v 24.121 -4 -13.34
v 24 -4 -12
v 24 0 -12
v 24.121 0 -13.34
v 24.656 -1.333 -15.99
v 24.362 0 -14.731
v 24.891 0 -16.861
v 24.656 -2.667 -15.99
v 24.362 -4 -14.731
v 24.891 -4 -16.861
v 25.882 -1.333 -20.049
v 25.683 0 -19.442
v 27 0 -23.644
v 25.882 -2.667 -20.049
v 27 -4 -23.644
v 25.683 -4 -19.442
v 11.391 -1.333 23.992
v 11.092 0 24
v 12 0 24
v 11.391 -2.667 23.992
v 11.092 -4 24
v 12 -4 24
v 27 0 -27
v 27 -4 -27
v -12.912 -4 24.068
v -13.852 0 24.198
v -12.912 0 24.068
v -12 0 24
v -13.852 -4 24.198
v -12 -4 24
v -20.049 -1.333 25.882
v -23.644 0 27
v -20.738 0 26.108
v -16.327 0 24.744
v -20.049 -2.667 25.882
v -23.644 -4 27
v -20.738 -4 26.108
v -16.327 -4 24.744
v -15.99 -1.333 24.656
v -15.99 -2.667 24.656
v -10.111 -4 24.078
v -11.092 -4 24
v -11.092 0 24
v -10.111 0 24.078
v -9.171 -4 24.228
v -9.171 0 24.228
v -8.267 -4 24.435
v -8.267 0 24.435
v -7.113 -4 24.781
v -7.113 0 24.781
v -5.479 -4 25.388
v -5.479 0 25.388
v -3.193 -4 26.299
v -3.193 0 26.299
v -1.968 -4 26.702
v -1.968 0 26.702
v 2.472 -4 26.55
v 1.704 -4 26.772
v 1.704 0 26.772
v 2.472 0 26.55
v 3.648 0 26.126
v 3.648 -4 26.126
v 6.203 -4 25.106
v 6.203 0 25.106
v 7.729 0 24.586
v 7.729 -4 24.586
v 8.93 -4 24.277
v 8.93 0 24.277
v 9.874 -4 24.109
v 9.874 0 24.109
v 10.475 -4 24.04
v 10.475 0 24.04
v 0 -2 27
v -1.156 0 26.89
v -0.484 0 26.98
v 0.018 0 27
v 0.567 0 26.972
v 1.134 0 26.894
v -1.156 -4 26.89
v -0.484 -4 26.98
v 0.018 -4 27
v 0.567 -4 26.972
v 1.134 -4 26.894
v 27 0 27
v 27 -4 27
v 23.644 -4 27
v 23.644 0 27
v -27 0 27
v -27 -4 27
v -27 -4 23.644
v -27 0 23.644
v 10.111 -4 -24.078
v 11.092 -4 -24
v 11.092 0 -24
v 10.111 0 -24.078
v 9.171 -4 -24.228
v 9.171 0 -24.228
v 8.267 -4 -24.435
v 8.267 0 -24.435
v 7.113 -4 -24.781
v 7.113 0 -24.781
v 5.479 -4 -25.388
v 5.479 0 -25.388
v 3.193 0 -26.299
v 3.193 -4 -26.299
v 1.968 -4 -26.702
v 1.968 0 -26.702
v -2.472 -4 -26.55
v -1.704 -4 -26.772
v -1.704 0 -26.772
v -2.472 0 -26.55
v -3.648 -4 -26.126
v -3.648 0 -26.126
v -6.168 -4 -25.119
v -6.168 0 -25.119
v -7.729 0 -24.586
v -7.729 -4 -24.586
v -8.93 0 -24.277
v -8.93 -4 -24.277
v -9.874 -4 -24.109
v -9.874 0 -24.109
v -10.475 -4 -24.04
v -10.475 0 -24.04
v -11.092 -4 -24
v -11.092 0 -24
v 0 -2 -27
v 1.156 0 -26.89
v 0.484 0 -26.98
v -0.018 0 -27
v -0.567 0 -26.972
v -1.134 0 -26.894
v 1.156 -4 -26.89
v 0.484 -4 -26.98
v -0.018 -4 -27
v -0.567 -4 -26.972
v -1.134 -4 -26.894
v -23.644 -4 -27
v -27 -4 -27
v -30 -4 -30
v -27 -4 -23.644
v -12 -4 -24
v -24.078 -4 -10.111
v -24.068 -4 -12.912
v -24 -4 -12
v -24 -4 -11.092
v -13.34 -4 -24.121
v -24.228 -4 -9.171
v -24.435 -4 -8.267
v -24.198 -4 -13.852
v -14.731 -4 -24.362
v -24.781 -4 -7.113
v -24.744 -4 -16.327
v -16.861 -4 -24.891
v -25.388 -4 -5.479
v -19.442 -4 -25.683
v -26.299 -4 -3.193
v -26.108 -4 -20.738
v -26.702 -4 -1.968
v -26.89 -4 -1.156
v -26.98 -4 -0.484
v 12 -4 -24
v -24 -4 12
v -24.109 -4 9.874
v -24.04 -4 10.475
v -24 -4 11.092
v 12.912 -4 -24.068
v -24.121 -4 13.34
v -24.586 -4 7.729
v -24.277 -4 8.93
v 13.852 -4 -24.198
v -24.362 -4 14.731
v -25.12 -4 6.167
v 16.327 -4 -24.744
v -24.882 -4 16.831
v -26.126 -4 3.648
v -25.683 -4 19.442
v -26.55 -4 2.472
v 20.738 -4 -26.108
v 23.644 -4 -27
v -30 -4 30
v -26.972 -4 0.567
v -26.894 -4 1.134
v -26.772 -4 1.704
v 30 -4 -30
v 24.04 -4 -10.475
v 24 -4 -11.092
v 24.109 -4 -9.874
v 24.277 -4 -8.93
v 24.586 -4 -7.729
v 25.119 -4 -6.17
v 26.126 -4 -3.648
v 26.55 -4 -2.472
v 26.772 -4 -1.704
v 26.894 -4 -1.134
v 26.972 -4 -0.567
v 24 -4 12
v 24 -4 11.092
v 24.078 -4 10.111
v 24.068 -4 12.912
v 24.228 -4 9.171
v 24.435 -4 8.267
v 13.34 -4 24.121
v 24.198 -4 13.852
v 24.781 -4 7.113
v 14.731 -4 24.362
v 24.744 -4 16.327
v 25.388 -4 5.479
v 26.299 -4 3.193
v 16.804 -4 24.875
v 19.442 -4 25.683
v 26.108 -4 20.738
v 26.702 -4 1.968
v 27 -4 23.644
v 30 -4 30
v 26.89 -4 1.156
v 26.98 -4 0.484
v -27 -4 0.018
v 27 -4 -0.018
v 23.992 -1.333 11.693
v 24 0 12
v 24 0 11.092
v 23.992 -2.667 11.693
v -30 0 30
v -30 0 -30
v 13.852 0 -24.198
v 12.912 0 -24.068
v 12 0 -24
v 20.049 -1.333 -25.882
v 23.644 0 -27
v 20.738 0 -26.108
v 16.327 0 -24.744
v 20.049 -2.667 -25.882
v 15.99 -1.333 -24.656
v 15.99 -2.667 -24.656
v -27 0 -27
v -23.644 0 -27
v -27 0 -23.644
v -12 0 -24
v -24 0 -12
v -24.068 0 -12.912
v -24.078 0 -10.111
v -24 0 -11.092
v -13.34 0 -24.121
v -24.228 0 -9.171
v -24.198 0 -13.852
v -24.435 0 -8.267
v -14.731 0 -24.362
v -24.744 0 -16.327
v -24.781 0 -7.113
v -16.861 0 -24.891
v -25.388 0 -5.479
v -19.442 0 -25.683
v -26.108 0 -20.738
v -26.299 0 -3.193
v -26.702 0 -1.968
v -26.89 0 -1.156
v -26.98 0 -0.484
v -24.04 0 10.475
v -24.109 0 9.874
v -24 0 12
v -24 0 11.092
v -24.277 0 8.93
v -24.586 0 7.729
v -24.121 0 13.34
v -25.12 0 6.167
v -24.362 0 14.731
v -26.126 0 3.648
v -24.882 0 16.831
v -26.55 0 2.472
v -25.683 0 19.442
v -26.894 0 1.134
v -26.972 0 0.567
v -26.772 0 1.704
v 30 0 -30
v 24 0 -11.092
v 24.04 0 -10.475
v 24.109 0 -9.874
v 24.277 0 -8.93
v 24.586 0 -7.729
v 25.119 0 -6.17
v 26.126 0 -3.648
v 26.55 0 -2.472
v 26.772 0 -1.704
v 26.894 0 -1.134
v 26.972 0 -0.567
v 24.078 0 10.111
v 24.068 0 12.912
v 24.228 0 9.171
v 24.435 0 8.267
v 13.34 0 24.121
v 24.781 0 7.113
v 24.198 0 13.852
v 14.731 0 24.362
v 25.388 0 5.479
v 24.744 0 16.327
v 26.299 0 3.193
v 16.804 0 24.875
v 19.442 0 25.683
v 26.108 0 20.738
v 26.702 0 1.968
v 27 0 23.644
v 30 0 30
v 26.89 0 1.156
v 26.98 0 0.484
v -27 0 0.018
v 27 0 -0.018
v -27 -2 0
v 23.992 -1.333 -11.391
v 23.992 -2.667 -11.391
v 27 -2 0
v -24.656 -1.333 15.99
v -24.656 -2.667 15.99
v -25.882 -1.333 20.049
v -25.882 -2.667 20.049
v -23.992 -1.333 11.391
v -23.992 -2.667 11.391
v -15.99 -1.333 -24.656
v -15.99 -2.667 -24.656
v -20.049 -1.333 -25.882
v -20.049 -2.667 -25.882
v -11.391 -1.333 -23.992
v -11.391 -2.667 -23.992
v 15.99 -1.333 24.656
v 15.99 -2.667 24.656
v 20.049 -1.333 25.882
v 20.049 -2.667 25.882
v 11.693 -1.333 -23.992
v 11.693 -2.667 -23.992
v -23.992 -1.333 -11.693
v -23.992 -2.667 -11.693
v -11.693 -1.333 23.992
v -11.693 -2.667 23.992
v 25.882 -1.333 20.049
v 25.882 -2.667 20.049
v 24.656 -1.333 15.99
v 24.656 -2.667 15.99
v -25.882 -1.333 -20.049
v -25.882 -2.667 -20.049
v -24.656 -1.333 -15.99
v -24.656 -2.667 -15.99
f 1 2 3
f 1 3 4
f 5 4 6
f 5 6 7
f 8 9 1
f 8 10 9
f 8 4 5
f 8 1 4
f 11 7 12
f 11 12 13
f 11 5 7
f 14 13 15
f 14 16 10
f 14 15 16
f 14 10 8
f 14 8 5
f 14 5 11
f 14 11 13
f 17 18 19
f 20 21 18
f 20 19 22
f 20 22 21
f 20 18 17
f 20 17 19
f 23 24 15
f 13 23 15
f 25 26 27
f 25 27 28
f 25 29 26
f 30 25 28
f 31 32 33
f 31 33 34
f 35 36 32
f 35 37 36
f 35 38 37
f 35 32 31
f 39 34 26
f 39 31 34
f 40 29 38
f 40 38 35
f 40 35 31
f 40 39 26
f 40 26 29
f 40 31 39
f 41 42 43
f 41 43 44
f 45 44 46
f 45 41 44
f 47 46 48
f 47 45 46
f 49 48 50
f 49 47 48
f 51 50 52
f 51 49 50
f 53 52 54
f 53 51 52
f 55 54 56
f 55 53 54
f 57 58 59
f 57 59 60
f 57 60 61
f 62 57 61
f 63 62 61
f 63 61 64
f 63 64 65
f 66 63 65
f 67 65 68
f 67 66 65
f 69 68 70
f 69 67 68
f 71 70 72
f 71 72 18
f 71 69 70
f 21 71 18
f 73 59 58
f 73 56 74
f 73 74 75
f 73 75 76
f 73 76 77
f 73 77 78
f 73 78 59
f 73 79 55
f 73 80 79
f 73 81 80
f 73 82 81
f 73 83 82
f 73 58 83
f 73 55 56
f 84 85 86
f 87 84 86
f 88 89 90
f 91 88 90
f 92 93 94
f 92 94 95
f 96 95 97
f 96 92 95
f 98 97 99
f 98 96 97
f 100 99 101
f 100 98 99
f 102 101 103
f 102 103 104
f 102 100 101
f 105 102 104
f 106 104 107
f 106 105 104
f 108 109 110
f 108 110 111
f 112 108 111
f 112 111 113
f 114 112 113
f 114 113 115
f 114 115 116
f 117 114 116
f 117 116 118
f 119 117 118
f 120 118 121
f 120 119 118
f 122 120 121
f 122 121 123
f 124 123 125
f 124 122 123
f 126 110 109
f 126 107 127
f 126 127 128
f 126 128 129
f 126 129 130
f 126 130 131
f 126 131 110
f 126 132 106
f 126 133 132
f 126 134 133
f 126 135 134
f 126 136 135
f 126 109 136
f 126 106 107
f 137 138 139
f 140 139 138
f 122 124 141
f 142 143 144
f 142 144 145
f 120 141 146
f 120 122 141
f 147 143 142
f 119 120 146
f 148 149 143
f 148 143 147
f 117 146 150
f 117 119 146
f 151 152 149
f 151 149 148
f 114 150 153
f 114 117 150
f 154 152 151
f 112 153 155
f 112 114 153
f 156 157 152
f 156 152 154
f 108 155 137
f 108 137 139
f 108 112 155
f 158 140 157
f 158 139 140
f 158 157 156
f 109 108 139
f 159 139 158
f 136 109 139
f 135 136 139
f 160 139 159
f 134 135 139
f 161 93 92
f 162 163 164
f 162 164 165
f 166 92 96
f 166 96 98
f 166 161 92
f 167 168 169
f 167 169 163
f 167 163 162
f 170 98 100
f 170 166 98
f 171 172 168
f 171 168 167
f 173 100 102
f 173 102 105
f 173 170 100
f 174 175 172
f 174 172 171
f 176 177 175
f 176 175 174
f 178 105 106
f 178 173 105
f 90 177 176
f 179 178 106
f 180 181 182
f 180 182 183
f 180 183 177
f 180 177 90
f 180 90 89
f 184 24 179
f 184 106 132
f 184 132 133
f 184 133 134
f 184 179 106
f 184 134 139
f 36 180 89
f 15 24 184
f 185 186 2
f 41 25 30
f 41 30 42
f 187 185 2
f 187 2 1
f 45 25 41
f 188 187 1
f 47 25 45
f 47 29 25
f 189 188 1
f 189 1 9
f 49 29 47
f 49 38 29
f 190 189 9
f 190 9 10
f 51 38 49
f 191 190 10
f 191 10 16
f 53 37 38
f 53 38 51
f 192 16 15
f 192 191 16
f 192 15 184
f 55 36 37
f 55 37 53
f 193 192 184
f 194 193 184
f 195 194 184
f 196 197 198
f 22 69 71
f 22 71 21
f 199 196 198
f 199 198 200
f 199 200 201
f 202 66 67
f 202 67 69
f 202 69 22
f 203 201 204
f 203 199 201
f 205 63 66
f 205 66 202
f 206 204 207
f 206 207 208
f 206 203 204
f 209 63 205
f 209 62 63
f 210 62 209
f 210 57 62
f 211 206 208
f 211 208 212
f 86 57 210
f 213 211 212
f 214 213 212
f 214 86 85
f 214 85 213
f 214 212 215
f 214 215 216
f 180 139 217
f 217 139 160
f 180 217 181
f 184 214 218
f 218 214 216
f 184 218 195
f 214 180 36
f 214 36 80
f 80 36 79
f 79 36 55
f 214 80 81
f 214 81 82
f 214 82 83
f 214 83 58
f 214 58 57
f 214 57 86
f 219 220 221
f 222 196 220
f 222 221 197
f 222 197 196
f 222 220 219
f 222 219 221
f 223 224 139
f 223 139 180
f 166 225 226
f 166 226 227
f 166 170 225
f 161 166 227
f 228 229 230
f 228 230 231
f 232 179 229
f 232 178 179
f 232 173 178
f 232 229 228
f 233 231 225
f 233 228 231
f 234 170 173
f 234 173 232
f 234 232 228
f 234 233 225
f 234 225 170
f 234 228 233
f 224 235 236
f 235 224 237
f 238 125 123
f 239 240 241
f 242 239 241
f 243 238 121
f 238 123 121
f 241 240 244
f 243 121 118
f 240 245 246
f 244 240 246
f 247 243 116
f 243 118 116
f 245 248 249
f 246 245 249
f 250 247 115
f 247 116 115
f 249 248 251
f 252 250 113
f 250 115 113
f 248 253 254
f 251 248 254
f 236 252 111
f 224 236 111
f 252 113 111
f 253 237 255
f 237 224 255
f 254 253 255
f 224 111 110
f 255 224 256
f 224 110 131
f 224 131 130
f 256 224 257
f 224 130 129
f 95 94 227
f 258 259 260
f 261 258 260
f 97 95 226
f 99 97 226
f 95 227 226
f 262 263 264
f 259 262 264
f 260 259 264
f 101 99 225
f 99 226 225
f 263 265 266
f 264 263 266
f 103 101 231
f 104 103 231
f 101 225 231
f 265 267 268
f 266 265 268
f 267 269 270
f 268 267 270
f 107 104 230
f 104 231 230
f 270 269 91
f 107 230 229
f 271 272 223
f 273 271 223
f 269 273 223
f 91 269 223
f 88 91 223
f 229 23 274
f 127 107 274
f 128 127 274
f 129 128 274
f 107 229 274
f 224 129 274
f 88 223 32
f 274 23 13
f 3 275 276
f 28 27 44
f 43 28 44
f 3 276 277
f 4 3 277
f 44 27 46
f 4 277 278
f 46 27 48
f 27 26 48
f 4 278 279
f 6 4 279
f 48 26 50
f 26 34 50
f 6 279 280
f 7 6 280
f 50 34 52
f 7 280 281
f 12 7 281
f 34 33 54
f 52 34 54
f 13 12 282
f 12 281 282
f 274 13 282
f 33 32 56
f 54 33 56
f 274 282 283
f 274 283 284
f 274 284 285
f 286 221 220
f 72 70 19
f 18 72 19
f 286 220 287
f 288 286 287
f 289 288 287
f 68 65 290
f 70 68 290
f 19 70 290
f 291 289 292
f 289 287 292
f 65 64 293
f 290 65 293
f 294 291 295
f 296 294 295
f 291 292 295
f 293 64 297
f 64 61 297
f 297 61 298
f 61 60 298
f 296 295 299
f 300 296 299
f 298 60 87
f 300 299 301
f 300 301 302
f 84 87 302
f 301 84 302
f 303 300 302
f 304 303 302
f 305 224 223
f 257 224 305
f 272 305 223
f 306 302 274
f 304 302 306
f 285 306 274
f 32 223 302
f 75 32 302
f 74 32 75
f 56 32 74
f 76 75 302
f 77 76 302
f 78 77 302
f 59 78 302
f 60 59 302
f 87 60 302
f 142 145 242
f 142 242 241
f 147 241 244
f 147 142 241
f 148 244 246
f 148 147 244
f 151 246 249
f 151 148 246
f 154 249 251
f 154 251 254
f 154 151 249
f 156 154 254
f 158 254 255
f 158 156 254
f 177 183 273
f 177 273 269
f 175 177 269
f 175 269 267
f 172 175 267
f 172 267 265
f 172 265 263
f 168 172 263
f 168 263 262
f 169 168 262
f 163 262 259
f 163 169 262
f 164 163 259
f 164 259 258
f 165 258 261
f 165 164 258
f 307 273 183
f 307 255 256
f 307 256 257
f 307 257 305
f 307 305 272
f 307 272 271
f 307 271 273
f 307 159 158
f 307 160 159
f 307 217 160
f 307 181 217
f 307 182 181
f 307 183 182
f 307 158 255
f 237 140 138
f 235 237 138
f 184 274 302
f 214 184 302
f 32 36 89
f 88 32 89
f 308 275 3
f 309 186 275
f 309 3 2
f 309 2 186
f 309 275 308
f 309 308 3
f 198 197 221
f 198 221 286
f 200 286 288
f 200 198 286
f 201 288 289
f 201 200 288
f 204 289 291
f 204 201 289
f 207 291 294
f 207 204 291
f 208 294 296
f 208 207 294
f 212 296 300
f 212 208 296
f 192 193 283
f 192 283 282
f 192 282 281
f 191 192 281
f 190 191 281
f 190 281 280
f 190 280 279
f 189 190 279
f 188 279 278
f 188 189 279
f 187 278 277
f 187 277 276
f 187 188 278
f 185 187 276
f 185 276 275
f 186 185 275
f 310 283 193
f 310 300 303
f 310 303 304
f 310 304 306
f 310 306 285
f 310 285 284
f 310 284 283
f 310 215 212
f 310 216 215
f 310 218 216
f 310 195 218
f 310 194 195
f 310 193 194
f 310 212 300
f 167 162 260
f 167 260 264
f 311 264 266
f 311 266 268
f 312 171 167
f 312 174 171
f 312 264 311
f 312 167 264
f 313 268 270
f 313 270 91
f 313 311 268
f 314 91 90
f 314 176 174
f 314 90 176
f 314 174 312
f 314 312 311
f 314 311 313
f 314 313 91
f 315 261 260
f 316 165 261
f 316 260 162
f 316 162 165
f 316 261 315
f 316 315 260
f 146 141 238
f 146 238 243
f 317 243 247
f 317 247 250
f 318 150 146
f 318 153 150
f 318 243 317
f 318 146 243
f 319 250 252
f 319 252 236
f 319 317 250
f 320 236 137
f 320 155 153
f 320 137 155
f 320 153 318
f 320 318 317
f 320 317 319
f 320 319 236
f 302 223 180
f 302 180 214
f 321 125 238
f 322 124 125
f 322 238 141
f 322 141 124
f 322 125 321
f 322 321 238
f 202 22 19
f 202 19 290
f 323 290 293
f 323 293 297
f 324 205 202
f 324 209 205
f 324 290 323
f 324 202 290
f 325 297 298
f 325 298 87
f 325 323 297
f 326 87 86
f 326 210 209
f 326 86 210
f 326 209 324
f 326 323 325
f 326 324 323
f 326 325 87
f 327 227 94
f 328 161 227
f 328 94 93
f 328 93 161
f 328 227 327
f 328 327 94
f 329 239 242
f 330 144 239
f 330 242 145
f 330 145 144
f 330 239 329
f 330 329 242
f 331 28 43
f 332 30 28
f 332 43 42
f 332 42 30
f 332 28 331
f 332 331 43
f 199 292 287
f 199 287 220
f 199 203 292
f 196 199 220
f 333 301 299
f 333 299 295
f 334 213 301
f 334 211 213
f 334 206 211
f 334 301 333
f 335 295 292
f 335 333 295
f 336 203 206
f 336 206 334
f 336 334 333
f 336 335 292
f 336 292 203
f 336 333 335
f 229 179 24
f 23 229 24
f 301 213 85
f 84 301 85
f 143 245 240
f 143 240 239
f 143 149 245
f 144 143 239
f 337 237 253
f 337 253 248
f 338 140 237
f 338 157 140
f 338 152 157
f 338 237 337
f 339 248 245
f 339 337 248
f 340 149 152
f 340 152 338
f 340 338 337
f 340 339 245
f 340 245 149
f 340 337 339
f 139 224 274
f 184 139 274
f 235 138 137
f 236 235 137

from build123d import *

# Parameters (mm, degrees)
F0_W     = 60
F0_H     = 60
F1_DEPTH = 4
F3_DEPTH = 4


with BuildPart() as f1:
    # F0 (on Front) → F1 (new body)
    with BuildSketch(Plane.XZ):
        Rectangle(F0_W, F0_H)
    extrude(amount=F1_DEPTH)

    # F2 (on face) → F3 (cut)
    with BuildSketch(Plane.XZ.offset(4)):
        with BuildLine():
            Line((-24, 24), (-24, 12))
            add(Edge.make_bspline(
                [(-24, 11.0916663679), (-23.9885126385, 11.3886601328), (-23.9880237808, 11.6913162711), (-24, 12)],
                knots=[0.930597722, 0.930597722, 0.930597722, 0.930597722, 0.9341837176, 0.9341837176, 0.9341837176, 0.9341837176], degree=3))
            Line((-24, 11.0916663679), (-24, 0))
            Line((-24, 0), (-24, -11.0916663679))
            add(Edge.make_bspline(
                [(-24, -12), (-23.9880237808, -11.6913162711), (-23.9885126385, -11.3886601328), (-24, -11.0916663679)],
                knots=[0.8158162824, 0.8158162824, 0.8158162824, 0.8158162824, 0.819402278, 0.819402278, 0.819402278, 0.819402278], degree=3))
            Line((-24, -12), (-24, -24))
            Line((-24, -24), (-12, -24))
            add(Edge.make_bspline(
                [(-11.0916663679, -24), (-11.3886601328, -23.9885126385), (-11.6913162711, -23.9880237808), (-12, -24)],
                knots=[0.680597722, 0.680597722, 0.680597722, 0.680597722, 0.6841837176, 0.6841837176, 0.6841837176, 0.6841837176], degree=3))
            Line((-11.0916663679, -24), (0, -24))
            Line((0, -24), (11.0916663679, -24))
            add(Edge.make_bspline(
                [(12, -24), (11.6913162711, -23.9880237808), (11.3886601328, -23.9885126385), (11.0916663679, -24)],
                knots=[0.5658162824, 0.5658162824, 0.5658162824, 0.5658162824, 0.569402278, 0.569402278, 0.569402278, 0.569402278], degree=3))
            Line((12, -24), (24, -24))
            Line((24, -24), (24, -12))
            add(Edge.make_bspline(
                [(24, -11.0916663679), (23.9885126385, -11.3886601328), (23.9880237808, -11.6913162711), (24, -12)],
                knots=[0.430597722, 0.430597722, 0.430597722, 0.430597722, 0.4341837176, 0.4341837176, 0.4341837176, 0.4341837176], degree=3))
            Line((24, -11.0916663679), (24, 0))
            Line((24, 0), (24, 11.0916663679))
            add(Edge.make_bspline(
                [(24, 12), (23.9880237808, 11.6913162711), (23.9885126385, 11.3886601328), (24, 11.0916663679)],
                knots=[0.3158162824, 0.3158162824, 0.3158162824, 0.3158162824, 0.319402278, 0.319402278, 0.319402278, 0.319402278], degree=3))
            Line((24, 12), (24, 24))
            Line((24, 24), (12, 24))
            add(Edge.make_bspline(
                [(11.0916663679, 24), (11.3886601328, 23.9885126385), (11.6913162711, 23.9880237808), (12, 24)],
                knots=[0.180597722, 0.180597722, 0.180597722, 0.180597722, 0.1841837176, 0.1841837176, 0.1841837176, 0.1841837176], degree=3))
            Line((11.0916663679, 24), (0, 24))
            Line((0, 24), (-11.0916663679, 24))
            add(Edge.make_bspline(
                [(-12, 24), (-11.6913162711, 23.9880237808), (-11.3886601328, 23.9885126385), (-11.0916663679, 24)],
                knots=[0.0658162824, 0.0658162824, 0.0658162824, 0.0658162824, 0.069402278, 0.069402278, 0.069402278, 0.069402278], degree=3))
            Line((-12, 24), (-24, 24))
        make_face()
        with BuildLine():
            Line((-23.6444065198, 27), (-27, 27))
            Line((-27, 27), (-27, 23.6444065198))
            add(Edge.make_bspline(
                [(-24, 12), (-24.1465778089, 15.7780023822), (-26.1603603507, 20.4589070033), (-27, 23.6444065198)],
                knots=[0.9341837176, 0.9341837176, 0.9341837176, 0.9341837176, 0.9780729754, 0.9780729754, 0.9780729754, 0.9780729754], degree=3))
            Line((-24, 12), (-24, 24))
            Line((-24, 24), (-12, 24))
            add(Edge.make_bspline(
                [(-23.6444065198, 27), (-20.4589070033, 26.1603603507), (-15.7780023822, 24.1465778089), (-12, 24)],
                knots=[0.0219270246, 0.0219270246, 0.0219270246, 0.0219270246, 0.0658162824, 0.0658162824, 0.0658162824, 0.0658162824], degree=3))
        make_face()
        with BuildLine():
            add(Edge.make_bspline(
                [(-2.98e-08, 27), (3.2435190013, 27.000000013), (6.4870380255, 24.1781014922), (11.0916663631, 24.0000000045)],
                knots=[0.125, 0.125, 0.125, 0.125, 0.180597722, 0.180597722, 0.180597722, 0.180597722], degree=3))
            add(Edge.make_bspline(
                [(-11.0916663679, 24), (-6.4870380342, 24.1781014842), (-3.243519032, 26.999999987), (-2.98e-08, 27)],
                knots=[0.069402278, 0.069402278, 0.069402278, 0.069402278, 0.125, 0.125, 0.125, 0.125], degree=3))
            Line((-11.0916663679, 24), (0, 24))
            Line((0, 24), (11.0916663679, 24))
        make_face()
        with BuildLine():
            Line((27, 27), (23.6444065198, 27))
            add(Edge.make_bspline(
                [(12, 24), (15.7780023822, 24.1465778089), (20.4589070033, 26.1603603507), (23.6444065198, 27)],
                knots=[0.1841837176, 0.1841837176, 0.1841837176, 0.1841837176, 0.2280729754, 0.2280729754, 0.2280729754, 0.2280729754], degree=3))
            Line((12, 24), (24, 24))
            Line((24, 24), (24, 12))
            add(Edge.make_bspline(
                [(27, 23.6444065198), (26.1603603507, 20.4589070033), (24.1465778089, 15.7780023822), (24, 12)],
                knots=[0.2719270246, 0.2719270246, 0.2719270246, 0.2719270246, 0.3158162824, 0.3158162824, 0.3158162824, 0.3158162824], degree=3))
            Line((27, 23.6444065198), (27, 27))
        make_face()
        with BuildLine():
            add(Edge.make_bspline(
                [(27, 0), (27, -3.2435190171), (24.1781014842, -6.4870380342), (24, -11.0916663679)],
                knots=[0.375, 0.375, 0.375, 0.375, 0.430597722, 0.430597722, 0.430597722, 0.430597722], degree=3))
            add(Edge.make_bspline(
                [(24, 11.0916663679), (24.1781014842, 6.4870380342), (27, 3.2435190171), (27, 0)],
                knots=[0.319402278, 0.319402278, 0.319402278, 0.319402278, 0.375, 0.375, 0.375, 0.375], degree=3))
            Line((24, 11.0916663679), (24, 0))
            Line((24, 0), (24, -11.0916663679))
        make_face()
        with BuildLine():
            add(Edge.make_bspline(
                [(23.6444065198, -27), (20.4589070033, -26.1603603507), (15.7780023822, -24.1465778089), (12, -24)],
                knots=[0.5219270246, 0.5219270246, 0.5219270246, 0.5219270246, 0.5658162824, 0.5658162824, 0.5658162824, 0.5658162824], degree=3))
            Line((23.6444065198, -27), (27, -27))
            Line((27, -27), (27, -23.6444065198))
            add(Edge.make_bspline(
                [(24, -12), (24.1465778089, -15.7780023822), (26.1603603507, -20.4589070033), (27, -23.6444065198)],
                knots=[0.4341837176, 0.4341837176, 0.4341837176, 0.4341837176, 0.4780729754, 0.4780729754, 0.4780729754, 0.4780729754], degree=3))
            Line((24, -12), (24, -24))
            Line((24, -24), (12, -24))
        make_face()
        with BuildLine():
            add(Edge.make_bspline(
                [(0, -27), (-3.2435190171, -27), (-6.4870380342, -24.1781014842), (-11.0916663679, -24)],
                knots=[0.625, 0.625, 0.625, 0.625, 0.680597722, 0.680597722, 0.680597722, 0.680597722], degree=3))
            add(Edge.make_bspline(
                [(11.0916663679, -24), (6.4870380342, -24.1781014842), (3.2435190171, -27), (0, -27)],
                knots=[0.569402278, 0.569402278, 0.569402278, 0.569402278, 0.625, 0.625, 0.625, 0.625], degree=3))
            Line((11.0916663679, -24), (0, -24))
            Line((0, -24), (-11.0916663679, -24))
        make_face()
        with BuildLine():
            add(Edge.make_bspline(
                [(-27, -23.6444065198), (-26.1603603507, -20.4589070033), (-24.1465778089, -15.7780023822), (-24, -12)],
                knots=[0.7719270246, 0.7719270246, 0.7719270246, 0.7719270246, 0.8158162824, 0.8158162824, 0.8158162824, 0.8158162824], degree=3))
            Line((-27, -23.6444065198), (-27, -27))
            Line((-27, -27), (-23.6444065198, -27))
            add(Edge.make_bspline(
                [(-12, -24), (-15.7780023822, -24.1465778089), (-20.4589070033, -26.1603603507), (-23.6444065198, -27)],
                knots=[0.6841837176, 0.6841837176, 0.6841837176, 0.6841837176, 0.7280729754, 0.7280729754, 0.7280729754, 0.7280729754], degree=3))
            Line((-12, -24), (-24, -24))
            Line((-24, -24), (-24, -12))
        make_face()
        with BuildLine():
            add(Edge.make_bspline(
                [(-27, 0), (-27, 3.2435190171), (-24.1781014842, 6.4870380342), (-24, 11.0916663679)],
                knots=[0.875, 0.875, 0.875, 0.875, 0.930597722, 0.930597722, 0.930597722, 0.930597722], degree=3))
            add(Edge.make_bspline(
                [(-24, -11.0916663679), (-24.1781014842, -6.4870380342), (-27, -3.2435190171), (-27, 0)],
                knots=[0.819402278, 0.819402278, 0.819402278, 0.819402278, 0.875, 0.875, 0.875, 0.875], degree=3))
            Line((-24, -11.0916663679), (-24, 0))
            Line((-24, 0), (-24, 11.0916663679))
        make_face()
    extrude(amount=-F3_DEPTH, mode=Mode.SUBTRACT)


solid = f1.part
